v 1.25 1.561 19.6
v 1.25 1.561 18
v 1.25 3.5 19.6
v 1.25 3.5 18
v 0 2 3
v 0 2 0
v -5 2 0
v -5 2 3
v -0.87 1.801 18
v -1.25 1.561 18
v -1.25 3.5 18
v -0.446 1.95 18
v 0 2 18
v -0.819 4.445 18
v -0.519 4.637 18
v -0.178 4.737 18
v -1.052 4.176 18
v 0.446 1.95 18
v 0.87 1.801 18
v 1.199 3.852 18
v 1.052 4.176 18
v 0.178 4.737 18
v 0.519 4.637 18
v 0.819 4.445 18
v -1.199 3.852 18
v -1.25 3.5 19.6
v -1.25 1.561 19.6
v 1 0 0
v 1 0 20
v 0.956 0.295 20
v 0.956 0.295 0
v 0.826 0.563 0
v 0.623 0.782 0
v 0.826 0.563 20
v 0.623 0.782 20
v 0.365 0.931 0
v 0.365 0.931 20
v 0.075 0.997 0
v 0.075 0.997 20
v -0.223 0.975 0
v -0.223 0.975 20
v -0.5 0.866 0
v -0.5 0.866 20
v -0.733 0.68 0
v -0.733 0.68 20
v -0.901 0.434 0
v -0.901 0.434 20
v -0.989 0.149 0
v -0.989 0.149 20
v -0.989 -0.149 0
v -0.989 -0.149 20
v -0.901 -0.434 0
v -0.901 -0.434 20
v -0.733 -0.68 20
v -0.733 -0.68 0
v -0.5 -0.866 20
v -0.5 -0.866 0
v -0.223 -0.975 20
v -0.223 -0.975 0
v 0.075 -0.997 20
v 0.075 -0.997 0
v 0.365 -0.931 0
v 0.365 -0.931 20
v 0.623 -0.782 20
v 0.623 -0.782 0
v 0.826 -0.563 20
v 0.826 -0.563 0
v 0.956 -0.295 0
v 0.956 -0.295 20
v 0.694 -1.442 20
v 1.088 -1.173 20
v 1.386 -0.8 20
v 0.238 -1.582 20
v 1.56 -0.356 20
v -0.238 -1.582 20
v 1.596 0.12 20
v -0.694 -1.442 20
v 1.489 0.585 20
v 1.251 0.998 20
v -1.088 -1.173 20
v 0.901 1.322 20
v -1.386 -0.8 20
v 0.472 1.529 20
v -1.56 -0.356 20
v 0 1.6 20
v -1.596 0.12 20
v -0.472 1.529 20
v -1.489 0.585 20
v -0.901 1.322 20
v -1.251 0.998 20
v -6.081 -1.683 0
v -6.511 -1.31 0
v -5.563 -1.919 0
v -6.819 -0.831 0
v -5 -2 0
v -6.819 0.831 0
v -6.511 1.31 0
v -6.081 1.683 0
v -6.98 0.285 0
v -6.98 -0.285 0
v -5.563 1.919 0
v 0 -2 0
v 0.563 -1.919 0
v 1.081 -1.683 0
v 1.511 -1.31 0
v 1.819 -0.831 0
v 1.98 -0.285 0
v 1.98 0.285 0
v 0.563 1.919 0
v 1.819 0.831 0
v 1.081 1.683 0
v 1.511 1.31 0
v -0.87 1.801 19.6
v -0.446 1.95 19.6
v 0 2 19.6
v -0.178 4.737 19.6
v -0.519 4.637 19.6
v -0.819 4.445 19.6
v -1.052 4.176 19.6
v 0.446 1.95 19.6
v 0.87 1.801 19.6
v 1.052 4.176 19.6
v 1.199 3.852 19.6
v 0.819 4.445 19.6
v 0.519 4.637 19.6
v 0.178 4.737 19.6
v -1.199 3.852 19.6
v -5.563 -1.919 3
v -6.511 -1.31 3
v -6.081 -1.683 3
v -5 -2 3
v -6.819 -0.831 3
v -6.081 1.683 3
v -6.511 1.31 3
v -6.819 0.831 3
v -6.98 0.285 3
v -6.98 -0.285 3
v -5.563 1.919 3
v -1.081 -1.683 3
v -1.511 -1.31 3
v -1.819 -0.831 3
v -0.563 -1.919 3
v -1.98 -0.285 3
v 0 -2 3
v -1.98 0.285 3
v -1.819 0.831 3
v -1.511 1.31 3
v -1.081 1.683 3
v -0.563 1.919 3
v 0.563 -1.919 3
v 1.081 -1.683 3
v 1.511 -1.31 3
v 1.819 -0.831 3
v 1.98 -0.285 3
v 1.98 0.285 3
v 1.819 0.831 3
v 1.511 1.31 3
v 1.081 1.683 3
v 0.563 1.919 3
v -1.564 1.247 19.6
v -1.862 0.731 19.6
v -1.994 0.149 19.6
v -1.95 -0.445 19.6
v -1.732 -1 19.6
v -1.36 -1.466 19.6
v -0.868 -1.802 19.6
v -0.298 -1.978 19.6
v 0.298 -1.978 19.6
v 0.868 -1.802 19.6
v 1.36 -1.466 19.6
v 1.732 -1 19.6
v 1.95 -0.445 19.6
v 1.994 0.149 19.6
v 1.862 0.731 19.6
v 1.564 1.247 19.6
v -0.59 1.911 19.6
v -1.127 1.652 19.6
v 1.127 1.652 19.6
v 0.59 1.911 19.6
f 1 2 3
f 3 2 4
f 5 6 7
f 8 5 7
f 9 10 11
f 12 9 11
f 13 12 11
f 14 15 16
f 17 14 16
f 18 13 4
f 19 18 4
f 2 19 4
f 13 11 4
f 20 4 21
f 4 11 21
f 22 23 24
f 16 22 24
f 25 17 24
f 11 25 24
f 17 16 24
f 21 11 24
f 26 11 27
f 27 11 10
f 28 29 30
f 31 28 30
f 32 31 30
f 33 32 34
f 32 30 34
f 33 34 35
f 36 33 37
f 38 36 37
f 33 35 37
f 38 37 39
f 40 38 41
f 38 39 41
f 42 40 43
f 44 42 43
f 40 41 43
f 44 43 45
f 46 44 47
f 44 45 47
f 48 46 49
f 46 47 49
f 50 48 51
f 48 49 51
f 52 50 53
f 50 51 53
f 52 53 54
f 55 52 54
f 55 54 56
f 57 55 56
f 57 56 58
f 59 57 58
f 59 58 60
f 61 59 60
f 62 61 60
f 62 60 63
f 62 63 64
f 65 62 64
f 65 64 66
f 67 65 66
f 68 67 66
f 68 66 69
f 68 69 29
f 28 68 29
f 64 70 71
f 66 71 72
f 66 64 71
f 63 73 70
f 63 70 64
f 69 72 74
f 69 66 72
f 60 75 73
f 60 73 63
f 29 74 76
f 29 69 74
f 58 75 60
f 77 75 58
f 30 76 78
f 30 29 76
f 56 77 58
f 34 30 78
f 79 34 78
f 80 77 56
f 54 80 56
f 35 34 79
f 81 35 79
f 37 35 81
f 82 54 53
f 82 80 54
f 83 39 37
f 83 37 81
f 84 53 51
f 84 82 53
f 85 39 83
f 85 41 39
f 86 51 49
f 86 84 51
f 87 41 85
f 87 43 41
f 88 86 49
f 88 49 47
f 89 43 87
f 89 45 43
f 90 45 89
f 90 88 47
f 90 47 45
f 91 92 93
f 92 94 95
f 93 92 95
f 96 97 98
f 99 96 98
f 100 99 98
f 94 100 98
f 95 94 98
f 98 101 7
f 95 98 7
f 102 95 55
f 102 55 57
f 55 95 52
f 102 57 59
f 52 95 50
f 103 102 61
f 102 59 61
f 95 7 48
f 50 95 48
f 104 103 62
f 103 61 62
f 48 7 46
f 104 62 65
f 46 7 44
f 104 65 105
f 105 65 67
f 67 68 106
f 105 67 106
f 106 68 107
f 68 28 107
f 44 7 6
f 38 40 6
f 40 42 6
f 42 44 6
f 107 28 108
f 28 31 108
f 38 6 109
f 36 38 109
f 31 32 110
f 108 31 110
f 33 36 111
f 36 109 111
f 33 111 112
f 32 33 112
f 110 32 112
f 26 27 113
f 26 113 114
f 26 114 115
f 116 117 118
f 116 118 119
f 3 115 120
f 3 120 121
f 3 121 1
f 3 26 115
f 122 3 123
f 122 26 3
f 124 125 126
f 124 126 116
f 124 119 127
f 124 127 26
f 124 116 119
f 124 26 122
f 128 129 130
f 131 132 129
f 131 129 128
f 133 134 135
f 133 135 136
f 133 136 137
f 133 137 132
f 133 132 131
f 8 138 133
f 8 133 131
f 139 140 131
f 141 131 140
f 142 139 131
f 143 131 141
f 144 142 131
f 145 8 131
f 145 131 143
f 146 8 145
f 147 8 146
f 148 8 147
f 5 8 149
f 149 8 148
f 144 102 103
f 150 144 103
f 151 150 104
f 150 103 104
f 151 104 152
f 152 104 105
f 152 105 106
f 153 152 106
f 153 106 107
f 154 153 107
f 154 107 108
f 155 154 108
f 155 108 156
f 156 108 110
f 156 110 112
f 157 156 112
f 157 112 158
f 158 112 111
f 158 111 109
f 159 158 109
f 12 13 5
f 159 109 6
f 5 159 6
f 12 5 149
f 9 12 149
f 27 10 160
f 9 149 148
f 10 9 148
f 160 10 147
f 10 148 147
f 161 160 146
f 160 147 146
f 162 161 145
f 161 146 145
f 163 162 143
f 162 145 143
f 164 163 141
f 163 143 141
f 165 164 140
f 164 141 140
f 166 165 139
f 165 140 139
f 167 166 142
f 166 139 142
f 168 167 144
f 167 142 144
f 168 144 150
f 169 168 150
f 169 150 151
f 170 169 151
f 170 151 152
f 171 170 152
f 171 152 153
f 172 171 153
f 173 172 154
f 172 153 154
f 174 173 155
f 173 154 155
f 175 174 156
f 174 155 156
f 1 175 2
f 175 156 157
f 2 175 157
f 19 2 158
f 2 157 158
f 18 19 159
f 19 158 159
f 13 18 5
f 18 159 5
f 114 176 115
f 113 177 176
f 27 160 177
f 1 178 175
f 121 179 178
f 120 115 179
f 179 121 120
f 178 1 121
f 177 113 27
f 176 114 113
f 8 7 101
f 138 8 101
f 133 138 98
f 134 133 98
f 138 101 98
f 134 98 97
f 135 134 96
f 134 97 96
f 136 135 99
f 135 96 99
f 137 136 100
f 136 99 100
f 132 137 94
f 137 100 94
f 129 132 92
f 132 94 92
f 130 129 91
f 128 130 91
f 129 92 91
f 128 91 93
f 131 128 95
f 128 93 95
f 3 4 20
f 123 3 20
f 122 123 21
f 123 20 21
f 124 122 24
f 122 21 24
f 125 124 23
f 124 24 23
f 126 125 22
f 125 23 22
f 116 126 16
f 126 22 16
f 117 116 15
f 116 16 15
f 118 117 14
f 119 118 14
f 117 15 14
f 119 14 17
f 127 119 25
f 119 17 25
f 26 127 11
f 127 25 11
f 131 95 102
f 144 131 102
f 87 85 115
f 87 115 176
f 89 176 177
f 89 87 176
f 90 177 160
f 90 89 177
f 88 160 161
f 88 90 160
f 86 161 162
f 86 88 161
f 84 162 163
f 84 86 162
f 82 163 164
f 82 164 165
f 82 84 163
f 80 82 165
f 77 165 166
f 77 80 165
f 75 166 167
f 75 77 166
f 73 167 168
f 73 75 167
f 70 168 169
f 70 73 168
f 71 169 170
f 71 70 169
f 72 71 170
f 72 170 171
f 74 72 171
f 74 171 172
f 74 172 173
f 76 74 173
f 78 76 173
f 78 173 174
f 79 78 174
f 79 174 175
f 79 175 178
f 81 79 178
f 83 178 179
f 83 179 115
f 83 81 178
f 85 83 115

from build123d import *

# Parameters (mm, degrees)
AUFSATZ_LINEAR_AUSTRAGEN1_DEPTH = 3
SKIZZE2_R                       = 2
AUFSATZ_LINEAR_AUSTRAGEN2_DEPTH = 17
AUFSATZ_LINEAR_START            = 15
AUFSATZ_LINEAR_AUSTRAGEN3_DEPTH = 1.6
SCHNITT_LINEAR_AUSTRAGEN1_REACH = 23.715
SKIZZE4_R                       = 1
FASE1_SIZE                      = 0.4


with BuildPart() as part:
    # Skizze1 → Aufsatz-Linear austragen1 (new body)
    with BuildSketch(Plane.XY):
        with BuildLine():
            Line((0, 2), (-5, 2))
            ThreePointArc((-5, 2), (-7, 0), (-5, -2))
            Line((-5, -2), (0, -2))
            ThreePointArc((0, -2), (2, 0), (0, 2))
        make_face()
    extrude(amount=AUFSATZ_LINEAR_AUSTRAGEN1_DEPTH)

    # Skizze2 → Aufsatz-Linear austragen2 (add)
    with BuildSketch(Plane.XY.offset(3)):
        with Locations(Location((0, 0, 0), (0, 0, 90))):
            Circle(SKIZZE2_R)
    extrude(amount=AUFSATZ_LINEAR_AUSTRAGEN2_DEPTH)

    # Skizze3 → Aufsatz-Linear austragen3 (add)
    with BuildSketch(Plane.XY.offset(3).offset(AUFSATZ_LINEAR_START)):
        with BuildLine():
            Line((-1.25, 3.5), (-1.25, 1.5612495))
            ThreePointArc((-1.25, 1.5612495), (0, 2), (1.25, 1.5612495))
            Line((1.25, 1.5612495), (1.25, 3.5))
            ThreePointArc((1.25, 3.5), (0, 4.75), (-1.25, 3.5))
        make_face()
    extrude(amount=AUFSATZ_LINEAR_AUSTRAGEN3_DEPTH)

    # Skizze4 → Schnitt-Linear austragen1 (cut, up to next)
    with BuildSketch(Plane.XY.offset(20), mode=Mode.PRIVATE) as schnitt_linear_austragen1_sk1:
        Circle(SKIZZE4_R)
    schnitt_linear_austragen1_tool1 = extrude(schnitt_linear_austragen1_sk1.sketch, amount=-SCHNITT_LINEAR_AUSTRAGEN1_REACH, mode=Mode.PRIVATE) & part.part
    add(schnitt_linear_austragen1_tool1.solids().sort_by_distance((0, 0, 20))[0], mode=Mode.SUBTRACT)

    # Fase1
    fase1_edges = [part.edges().sort_by_distance(p)[0] for p in [
        (0, -2, 20),
    ]]
    chamfer(fase1_edges, length=FASE1_SIZE - 0.0001)  # a hair under: the kernel refuses the full size


solid = part.part
